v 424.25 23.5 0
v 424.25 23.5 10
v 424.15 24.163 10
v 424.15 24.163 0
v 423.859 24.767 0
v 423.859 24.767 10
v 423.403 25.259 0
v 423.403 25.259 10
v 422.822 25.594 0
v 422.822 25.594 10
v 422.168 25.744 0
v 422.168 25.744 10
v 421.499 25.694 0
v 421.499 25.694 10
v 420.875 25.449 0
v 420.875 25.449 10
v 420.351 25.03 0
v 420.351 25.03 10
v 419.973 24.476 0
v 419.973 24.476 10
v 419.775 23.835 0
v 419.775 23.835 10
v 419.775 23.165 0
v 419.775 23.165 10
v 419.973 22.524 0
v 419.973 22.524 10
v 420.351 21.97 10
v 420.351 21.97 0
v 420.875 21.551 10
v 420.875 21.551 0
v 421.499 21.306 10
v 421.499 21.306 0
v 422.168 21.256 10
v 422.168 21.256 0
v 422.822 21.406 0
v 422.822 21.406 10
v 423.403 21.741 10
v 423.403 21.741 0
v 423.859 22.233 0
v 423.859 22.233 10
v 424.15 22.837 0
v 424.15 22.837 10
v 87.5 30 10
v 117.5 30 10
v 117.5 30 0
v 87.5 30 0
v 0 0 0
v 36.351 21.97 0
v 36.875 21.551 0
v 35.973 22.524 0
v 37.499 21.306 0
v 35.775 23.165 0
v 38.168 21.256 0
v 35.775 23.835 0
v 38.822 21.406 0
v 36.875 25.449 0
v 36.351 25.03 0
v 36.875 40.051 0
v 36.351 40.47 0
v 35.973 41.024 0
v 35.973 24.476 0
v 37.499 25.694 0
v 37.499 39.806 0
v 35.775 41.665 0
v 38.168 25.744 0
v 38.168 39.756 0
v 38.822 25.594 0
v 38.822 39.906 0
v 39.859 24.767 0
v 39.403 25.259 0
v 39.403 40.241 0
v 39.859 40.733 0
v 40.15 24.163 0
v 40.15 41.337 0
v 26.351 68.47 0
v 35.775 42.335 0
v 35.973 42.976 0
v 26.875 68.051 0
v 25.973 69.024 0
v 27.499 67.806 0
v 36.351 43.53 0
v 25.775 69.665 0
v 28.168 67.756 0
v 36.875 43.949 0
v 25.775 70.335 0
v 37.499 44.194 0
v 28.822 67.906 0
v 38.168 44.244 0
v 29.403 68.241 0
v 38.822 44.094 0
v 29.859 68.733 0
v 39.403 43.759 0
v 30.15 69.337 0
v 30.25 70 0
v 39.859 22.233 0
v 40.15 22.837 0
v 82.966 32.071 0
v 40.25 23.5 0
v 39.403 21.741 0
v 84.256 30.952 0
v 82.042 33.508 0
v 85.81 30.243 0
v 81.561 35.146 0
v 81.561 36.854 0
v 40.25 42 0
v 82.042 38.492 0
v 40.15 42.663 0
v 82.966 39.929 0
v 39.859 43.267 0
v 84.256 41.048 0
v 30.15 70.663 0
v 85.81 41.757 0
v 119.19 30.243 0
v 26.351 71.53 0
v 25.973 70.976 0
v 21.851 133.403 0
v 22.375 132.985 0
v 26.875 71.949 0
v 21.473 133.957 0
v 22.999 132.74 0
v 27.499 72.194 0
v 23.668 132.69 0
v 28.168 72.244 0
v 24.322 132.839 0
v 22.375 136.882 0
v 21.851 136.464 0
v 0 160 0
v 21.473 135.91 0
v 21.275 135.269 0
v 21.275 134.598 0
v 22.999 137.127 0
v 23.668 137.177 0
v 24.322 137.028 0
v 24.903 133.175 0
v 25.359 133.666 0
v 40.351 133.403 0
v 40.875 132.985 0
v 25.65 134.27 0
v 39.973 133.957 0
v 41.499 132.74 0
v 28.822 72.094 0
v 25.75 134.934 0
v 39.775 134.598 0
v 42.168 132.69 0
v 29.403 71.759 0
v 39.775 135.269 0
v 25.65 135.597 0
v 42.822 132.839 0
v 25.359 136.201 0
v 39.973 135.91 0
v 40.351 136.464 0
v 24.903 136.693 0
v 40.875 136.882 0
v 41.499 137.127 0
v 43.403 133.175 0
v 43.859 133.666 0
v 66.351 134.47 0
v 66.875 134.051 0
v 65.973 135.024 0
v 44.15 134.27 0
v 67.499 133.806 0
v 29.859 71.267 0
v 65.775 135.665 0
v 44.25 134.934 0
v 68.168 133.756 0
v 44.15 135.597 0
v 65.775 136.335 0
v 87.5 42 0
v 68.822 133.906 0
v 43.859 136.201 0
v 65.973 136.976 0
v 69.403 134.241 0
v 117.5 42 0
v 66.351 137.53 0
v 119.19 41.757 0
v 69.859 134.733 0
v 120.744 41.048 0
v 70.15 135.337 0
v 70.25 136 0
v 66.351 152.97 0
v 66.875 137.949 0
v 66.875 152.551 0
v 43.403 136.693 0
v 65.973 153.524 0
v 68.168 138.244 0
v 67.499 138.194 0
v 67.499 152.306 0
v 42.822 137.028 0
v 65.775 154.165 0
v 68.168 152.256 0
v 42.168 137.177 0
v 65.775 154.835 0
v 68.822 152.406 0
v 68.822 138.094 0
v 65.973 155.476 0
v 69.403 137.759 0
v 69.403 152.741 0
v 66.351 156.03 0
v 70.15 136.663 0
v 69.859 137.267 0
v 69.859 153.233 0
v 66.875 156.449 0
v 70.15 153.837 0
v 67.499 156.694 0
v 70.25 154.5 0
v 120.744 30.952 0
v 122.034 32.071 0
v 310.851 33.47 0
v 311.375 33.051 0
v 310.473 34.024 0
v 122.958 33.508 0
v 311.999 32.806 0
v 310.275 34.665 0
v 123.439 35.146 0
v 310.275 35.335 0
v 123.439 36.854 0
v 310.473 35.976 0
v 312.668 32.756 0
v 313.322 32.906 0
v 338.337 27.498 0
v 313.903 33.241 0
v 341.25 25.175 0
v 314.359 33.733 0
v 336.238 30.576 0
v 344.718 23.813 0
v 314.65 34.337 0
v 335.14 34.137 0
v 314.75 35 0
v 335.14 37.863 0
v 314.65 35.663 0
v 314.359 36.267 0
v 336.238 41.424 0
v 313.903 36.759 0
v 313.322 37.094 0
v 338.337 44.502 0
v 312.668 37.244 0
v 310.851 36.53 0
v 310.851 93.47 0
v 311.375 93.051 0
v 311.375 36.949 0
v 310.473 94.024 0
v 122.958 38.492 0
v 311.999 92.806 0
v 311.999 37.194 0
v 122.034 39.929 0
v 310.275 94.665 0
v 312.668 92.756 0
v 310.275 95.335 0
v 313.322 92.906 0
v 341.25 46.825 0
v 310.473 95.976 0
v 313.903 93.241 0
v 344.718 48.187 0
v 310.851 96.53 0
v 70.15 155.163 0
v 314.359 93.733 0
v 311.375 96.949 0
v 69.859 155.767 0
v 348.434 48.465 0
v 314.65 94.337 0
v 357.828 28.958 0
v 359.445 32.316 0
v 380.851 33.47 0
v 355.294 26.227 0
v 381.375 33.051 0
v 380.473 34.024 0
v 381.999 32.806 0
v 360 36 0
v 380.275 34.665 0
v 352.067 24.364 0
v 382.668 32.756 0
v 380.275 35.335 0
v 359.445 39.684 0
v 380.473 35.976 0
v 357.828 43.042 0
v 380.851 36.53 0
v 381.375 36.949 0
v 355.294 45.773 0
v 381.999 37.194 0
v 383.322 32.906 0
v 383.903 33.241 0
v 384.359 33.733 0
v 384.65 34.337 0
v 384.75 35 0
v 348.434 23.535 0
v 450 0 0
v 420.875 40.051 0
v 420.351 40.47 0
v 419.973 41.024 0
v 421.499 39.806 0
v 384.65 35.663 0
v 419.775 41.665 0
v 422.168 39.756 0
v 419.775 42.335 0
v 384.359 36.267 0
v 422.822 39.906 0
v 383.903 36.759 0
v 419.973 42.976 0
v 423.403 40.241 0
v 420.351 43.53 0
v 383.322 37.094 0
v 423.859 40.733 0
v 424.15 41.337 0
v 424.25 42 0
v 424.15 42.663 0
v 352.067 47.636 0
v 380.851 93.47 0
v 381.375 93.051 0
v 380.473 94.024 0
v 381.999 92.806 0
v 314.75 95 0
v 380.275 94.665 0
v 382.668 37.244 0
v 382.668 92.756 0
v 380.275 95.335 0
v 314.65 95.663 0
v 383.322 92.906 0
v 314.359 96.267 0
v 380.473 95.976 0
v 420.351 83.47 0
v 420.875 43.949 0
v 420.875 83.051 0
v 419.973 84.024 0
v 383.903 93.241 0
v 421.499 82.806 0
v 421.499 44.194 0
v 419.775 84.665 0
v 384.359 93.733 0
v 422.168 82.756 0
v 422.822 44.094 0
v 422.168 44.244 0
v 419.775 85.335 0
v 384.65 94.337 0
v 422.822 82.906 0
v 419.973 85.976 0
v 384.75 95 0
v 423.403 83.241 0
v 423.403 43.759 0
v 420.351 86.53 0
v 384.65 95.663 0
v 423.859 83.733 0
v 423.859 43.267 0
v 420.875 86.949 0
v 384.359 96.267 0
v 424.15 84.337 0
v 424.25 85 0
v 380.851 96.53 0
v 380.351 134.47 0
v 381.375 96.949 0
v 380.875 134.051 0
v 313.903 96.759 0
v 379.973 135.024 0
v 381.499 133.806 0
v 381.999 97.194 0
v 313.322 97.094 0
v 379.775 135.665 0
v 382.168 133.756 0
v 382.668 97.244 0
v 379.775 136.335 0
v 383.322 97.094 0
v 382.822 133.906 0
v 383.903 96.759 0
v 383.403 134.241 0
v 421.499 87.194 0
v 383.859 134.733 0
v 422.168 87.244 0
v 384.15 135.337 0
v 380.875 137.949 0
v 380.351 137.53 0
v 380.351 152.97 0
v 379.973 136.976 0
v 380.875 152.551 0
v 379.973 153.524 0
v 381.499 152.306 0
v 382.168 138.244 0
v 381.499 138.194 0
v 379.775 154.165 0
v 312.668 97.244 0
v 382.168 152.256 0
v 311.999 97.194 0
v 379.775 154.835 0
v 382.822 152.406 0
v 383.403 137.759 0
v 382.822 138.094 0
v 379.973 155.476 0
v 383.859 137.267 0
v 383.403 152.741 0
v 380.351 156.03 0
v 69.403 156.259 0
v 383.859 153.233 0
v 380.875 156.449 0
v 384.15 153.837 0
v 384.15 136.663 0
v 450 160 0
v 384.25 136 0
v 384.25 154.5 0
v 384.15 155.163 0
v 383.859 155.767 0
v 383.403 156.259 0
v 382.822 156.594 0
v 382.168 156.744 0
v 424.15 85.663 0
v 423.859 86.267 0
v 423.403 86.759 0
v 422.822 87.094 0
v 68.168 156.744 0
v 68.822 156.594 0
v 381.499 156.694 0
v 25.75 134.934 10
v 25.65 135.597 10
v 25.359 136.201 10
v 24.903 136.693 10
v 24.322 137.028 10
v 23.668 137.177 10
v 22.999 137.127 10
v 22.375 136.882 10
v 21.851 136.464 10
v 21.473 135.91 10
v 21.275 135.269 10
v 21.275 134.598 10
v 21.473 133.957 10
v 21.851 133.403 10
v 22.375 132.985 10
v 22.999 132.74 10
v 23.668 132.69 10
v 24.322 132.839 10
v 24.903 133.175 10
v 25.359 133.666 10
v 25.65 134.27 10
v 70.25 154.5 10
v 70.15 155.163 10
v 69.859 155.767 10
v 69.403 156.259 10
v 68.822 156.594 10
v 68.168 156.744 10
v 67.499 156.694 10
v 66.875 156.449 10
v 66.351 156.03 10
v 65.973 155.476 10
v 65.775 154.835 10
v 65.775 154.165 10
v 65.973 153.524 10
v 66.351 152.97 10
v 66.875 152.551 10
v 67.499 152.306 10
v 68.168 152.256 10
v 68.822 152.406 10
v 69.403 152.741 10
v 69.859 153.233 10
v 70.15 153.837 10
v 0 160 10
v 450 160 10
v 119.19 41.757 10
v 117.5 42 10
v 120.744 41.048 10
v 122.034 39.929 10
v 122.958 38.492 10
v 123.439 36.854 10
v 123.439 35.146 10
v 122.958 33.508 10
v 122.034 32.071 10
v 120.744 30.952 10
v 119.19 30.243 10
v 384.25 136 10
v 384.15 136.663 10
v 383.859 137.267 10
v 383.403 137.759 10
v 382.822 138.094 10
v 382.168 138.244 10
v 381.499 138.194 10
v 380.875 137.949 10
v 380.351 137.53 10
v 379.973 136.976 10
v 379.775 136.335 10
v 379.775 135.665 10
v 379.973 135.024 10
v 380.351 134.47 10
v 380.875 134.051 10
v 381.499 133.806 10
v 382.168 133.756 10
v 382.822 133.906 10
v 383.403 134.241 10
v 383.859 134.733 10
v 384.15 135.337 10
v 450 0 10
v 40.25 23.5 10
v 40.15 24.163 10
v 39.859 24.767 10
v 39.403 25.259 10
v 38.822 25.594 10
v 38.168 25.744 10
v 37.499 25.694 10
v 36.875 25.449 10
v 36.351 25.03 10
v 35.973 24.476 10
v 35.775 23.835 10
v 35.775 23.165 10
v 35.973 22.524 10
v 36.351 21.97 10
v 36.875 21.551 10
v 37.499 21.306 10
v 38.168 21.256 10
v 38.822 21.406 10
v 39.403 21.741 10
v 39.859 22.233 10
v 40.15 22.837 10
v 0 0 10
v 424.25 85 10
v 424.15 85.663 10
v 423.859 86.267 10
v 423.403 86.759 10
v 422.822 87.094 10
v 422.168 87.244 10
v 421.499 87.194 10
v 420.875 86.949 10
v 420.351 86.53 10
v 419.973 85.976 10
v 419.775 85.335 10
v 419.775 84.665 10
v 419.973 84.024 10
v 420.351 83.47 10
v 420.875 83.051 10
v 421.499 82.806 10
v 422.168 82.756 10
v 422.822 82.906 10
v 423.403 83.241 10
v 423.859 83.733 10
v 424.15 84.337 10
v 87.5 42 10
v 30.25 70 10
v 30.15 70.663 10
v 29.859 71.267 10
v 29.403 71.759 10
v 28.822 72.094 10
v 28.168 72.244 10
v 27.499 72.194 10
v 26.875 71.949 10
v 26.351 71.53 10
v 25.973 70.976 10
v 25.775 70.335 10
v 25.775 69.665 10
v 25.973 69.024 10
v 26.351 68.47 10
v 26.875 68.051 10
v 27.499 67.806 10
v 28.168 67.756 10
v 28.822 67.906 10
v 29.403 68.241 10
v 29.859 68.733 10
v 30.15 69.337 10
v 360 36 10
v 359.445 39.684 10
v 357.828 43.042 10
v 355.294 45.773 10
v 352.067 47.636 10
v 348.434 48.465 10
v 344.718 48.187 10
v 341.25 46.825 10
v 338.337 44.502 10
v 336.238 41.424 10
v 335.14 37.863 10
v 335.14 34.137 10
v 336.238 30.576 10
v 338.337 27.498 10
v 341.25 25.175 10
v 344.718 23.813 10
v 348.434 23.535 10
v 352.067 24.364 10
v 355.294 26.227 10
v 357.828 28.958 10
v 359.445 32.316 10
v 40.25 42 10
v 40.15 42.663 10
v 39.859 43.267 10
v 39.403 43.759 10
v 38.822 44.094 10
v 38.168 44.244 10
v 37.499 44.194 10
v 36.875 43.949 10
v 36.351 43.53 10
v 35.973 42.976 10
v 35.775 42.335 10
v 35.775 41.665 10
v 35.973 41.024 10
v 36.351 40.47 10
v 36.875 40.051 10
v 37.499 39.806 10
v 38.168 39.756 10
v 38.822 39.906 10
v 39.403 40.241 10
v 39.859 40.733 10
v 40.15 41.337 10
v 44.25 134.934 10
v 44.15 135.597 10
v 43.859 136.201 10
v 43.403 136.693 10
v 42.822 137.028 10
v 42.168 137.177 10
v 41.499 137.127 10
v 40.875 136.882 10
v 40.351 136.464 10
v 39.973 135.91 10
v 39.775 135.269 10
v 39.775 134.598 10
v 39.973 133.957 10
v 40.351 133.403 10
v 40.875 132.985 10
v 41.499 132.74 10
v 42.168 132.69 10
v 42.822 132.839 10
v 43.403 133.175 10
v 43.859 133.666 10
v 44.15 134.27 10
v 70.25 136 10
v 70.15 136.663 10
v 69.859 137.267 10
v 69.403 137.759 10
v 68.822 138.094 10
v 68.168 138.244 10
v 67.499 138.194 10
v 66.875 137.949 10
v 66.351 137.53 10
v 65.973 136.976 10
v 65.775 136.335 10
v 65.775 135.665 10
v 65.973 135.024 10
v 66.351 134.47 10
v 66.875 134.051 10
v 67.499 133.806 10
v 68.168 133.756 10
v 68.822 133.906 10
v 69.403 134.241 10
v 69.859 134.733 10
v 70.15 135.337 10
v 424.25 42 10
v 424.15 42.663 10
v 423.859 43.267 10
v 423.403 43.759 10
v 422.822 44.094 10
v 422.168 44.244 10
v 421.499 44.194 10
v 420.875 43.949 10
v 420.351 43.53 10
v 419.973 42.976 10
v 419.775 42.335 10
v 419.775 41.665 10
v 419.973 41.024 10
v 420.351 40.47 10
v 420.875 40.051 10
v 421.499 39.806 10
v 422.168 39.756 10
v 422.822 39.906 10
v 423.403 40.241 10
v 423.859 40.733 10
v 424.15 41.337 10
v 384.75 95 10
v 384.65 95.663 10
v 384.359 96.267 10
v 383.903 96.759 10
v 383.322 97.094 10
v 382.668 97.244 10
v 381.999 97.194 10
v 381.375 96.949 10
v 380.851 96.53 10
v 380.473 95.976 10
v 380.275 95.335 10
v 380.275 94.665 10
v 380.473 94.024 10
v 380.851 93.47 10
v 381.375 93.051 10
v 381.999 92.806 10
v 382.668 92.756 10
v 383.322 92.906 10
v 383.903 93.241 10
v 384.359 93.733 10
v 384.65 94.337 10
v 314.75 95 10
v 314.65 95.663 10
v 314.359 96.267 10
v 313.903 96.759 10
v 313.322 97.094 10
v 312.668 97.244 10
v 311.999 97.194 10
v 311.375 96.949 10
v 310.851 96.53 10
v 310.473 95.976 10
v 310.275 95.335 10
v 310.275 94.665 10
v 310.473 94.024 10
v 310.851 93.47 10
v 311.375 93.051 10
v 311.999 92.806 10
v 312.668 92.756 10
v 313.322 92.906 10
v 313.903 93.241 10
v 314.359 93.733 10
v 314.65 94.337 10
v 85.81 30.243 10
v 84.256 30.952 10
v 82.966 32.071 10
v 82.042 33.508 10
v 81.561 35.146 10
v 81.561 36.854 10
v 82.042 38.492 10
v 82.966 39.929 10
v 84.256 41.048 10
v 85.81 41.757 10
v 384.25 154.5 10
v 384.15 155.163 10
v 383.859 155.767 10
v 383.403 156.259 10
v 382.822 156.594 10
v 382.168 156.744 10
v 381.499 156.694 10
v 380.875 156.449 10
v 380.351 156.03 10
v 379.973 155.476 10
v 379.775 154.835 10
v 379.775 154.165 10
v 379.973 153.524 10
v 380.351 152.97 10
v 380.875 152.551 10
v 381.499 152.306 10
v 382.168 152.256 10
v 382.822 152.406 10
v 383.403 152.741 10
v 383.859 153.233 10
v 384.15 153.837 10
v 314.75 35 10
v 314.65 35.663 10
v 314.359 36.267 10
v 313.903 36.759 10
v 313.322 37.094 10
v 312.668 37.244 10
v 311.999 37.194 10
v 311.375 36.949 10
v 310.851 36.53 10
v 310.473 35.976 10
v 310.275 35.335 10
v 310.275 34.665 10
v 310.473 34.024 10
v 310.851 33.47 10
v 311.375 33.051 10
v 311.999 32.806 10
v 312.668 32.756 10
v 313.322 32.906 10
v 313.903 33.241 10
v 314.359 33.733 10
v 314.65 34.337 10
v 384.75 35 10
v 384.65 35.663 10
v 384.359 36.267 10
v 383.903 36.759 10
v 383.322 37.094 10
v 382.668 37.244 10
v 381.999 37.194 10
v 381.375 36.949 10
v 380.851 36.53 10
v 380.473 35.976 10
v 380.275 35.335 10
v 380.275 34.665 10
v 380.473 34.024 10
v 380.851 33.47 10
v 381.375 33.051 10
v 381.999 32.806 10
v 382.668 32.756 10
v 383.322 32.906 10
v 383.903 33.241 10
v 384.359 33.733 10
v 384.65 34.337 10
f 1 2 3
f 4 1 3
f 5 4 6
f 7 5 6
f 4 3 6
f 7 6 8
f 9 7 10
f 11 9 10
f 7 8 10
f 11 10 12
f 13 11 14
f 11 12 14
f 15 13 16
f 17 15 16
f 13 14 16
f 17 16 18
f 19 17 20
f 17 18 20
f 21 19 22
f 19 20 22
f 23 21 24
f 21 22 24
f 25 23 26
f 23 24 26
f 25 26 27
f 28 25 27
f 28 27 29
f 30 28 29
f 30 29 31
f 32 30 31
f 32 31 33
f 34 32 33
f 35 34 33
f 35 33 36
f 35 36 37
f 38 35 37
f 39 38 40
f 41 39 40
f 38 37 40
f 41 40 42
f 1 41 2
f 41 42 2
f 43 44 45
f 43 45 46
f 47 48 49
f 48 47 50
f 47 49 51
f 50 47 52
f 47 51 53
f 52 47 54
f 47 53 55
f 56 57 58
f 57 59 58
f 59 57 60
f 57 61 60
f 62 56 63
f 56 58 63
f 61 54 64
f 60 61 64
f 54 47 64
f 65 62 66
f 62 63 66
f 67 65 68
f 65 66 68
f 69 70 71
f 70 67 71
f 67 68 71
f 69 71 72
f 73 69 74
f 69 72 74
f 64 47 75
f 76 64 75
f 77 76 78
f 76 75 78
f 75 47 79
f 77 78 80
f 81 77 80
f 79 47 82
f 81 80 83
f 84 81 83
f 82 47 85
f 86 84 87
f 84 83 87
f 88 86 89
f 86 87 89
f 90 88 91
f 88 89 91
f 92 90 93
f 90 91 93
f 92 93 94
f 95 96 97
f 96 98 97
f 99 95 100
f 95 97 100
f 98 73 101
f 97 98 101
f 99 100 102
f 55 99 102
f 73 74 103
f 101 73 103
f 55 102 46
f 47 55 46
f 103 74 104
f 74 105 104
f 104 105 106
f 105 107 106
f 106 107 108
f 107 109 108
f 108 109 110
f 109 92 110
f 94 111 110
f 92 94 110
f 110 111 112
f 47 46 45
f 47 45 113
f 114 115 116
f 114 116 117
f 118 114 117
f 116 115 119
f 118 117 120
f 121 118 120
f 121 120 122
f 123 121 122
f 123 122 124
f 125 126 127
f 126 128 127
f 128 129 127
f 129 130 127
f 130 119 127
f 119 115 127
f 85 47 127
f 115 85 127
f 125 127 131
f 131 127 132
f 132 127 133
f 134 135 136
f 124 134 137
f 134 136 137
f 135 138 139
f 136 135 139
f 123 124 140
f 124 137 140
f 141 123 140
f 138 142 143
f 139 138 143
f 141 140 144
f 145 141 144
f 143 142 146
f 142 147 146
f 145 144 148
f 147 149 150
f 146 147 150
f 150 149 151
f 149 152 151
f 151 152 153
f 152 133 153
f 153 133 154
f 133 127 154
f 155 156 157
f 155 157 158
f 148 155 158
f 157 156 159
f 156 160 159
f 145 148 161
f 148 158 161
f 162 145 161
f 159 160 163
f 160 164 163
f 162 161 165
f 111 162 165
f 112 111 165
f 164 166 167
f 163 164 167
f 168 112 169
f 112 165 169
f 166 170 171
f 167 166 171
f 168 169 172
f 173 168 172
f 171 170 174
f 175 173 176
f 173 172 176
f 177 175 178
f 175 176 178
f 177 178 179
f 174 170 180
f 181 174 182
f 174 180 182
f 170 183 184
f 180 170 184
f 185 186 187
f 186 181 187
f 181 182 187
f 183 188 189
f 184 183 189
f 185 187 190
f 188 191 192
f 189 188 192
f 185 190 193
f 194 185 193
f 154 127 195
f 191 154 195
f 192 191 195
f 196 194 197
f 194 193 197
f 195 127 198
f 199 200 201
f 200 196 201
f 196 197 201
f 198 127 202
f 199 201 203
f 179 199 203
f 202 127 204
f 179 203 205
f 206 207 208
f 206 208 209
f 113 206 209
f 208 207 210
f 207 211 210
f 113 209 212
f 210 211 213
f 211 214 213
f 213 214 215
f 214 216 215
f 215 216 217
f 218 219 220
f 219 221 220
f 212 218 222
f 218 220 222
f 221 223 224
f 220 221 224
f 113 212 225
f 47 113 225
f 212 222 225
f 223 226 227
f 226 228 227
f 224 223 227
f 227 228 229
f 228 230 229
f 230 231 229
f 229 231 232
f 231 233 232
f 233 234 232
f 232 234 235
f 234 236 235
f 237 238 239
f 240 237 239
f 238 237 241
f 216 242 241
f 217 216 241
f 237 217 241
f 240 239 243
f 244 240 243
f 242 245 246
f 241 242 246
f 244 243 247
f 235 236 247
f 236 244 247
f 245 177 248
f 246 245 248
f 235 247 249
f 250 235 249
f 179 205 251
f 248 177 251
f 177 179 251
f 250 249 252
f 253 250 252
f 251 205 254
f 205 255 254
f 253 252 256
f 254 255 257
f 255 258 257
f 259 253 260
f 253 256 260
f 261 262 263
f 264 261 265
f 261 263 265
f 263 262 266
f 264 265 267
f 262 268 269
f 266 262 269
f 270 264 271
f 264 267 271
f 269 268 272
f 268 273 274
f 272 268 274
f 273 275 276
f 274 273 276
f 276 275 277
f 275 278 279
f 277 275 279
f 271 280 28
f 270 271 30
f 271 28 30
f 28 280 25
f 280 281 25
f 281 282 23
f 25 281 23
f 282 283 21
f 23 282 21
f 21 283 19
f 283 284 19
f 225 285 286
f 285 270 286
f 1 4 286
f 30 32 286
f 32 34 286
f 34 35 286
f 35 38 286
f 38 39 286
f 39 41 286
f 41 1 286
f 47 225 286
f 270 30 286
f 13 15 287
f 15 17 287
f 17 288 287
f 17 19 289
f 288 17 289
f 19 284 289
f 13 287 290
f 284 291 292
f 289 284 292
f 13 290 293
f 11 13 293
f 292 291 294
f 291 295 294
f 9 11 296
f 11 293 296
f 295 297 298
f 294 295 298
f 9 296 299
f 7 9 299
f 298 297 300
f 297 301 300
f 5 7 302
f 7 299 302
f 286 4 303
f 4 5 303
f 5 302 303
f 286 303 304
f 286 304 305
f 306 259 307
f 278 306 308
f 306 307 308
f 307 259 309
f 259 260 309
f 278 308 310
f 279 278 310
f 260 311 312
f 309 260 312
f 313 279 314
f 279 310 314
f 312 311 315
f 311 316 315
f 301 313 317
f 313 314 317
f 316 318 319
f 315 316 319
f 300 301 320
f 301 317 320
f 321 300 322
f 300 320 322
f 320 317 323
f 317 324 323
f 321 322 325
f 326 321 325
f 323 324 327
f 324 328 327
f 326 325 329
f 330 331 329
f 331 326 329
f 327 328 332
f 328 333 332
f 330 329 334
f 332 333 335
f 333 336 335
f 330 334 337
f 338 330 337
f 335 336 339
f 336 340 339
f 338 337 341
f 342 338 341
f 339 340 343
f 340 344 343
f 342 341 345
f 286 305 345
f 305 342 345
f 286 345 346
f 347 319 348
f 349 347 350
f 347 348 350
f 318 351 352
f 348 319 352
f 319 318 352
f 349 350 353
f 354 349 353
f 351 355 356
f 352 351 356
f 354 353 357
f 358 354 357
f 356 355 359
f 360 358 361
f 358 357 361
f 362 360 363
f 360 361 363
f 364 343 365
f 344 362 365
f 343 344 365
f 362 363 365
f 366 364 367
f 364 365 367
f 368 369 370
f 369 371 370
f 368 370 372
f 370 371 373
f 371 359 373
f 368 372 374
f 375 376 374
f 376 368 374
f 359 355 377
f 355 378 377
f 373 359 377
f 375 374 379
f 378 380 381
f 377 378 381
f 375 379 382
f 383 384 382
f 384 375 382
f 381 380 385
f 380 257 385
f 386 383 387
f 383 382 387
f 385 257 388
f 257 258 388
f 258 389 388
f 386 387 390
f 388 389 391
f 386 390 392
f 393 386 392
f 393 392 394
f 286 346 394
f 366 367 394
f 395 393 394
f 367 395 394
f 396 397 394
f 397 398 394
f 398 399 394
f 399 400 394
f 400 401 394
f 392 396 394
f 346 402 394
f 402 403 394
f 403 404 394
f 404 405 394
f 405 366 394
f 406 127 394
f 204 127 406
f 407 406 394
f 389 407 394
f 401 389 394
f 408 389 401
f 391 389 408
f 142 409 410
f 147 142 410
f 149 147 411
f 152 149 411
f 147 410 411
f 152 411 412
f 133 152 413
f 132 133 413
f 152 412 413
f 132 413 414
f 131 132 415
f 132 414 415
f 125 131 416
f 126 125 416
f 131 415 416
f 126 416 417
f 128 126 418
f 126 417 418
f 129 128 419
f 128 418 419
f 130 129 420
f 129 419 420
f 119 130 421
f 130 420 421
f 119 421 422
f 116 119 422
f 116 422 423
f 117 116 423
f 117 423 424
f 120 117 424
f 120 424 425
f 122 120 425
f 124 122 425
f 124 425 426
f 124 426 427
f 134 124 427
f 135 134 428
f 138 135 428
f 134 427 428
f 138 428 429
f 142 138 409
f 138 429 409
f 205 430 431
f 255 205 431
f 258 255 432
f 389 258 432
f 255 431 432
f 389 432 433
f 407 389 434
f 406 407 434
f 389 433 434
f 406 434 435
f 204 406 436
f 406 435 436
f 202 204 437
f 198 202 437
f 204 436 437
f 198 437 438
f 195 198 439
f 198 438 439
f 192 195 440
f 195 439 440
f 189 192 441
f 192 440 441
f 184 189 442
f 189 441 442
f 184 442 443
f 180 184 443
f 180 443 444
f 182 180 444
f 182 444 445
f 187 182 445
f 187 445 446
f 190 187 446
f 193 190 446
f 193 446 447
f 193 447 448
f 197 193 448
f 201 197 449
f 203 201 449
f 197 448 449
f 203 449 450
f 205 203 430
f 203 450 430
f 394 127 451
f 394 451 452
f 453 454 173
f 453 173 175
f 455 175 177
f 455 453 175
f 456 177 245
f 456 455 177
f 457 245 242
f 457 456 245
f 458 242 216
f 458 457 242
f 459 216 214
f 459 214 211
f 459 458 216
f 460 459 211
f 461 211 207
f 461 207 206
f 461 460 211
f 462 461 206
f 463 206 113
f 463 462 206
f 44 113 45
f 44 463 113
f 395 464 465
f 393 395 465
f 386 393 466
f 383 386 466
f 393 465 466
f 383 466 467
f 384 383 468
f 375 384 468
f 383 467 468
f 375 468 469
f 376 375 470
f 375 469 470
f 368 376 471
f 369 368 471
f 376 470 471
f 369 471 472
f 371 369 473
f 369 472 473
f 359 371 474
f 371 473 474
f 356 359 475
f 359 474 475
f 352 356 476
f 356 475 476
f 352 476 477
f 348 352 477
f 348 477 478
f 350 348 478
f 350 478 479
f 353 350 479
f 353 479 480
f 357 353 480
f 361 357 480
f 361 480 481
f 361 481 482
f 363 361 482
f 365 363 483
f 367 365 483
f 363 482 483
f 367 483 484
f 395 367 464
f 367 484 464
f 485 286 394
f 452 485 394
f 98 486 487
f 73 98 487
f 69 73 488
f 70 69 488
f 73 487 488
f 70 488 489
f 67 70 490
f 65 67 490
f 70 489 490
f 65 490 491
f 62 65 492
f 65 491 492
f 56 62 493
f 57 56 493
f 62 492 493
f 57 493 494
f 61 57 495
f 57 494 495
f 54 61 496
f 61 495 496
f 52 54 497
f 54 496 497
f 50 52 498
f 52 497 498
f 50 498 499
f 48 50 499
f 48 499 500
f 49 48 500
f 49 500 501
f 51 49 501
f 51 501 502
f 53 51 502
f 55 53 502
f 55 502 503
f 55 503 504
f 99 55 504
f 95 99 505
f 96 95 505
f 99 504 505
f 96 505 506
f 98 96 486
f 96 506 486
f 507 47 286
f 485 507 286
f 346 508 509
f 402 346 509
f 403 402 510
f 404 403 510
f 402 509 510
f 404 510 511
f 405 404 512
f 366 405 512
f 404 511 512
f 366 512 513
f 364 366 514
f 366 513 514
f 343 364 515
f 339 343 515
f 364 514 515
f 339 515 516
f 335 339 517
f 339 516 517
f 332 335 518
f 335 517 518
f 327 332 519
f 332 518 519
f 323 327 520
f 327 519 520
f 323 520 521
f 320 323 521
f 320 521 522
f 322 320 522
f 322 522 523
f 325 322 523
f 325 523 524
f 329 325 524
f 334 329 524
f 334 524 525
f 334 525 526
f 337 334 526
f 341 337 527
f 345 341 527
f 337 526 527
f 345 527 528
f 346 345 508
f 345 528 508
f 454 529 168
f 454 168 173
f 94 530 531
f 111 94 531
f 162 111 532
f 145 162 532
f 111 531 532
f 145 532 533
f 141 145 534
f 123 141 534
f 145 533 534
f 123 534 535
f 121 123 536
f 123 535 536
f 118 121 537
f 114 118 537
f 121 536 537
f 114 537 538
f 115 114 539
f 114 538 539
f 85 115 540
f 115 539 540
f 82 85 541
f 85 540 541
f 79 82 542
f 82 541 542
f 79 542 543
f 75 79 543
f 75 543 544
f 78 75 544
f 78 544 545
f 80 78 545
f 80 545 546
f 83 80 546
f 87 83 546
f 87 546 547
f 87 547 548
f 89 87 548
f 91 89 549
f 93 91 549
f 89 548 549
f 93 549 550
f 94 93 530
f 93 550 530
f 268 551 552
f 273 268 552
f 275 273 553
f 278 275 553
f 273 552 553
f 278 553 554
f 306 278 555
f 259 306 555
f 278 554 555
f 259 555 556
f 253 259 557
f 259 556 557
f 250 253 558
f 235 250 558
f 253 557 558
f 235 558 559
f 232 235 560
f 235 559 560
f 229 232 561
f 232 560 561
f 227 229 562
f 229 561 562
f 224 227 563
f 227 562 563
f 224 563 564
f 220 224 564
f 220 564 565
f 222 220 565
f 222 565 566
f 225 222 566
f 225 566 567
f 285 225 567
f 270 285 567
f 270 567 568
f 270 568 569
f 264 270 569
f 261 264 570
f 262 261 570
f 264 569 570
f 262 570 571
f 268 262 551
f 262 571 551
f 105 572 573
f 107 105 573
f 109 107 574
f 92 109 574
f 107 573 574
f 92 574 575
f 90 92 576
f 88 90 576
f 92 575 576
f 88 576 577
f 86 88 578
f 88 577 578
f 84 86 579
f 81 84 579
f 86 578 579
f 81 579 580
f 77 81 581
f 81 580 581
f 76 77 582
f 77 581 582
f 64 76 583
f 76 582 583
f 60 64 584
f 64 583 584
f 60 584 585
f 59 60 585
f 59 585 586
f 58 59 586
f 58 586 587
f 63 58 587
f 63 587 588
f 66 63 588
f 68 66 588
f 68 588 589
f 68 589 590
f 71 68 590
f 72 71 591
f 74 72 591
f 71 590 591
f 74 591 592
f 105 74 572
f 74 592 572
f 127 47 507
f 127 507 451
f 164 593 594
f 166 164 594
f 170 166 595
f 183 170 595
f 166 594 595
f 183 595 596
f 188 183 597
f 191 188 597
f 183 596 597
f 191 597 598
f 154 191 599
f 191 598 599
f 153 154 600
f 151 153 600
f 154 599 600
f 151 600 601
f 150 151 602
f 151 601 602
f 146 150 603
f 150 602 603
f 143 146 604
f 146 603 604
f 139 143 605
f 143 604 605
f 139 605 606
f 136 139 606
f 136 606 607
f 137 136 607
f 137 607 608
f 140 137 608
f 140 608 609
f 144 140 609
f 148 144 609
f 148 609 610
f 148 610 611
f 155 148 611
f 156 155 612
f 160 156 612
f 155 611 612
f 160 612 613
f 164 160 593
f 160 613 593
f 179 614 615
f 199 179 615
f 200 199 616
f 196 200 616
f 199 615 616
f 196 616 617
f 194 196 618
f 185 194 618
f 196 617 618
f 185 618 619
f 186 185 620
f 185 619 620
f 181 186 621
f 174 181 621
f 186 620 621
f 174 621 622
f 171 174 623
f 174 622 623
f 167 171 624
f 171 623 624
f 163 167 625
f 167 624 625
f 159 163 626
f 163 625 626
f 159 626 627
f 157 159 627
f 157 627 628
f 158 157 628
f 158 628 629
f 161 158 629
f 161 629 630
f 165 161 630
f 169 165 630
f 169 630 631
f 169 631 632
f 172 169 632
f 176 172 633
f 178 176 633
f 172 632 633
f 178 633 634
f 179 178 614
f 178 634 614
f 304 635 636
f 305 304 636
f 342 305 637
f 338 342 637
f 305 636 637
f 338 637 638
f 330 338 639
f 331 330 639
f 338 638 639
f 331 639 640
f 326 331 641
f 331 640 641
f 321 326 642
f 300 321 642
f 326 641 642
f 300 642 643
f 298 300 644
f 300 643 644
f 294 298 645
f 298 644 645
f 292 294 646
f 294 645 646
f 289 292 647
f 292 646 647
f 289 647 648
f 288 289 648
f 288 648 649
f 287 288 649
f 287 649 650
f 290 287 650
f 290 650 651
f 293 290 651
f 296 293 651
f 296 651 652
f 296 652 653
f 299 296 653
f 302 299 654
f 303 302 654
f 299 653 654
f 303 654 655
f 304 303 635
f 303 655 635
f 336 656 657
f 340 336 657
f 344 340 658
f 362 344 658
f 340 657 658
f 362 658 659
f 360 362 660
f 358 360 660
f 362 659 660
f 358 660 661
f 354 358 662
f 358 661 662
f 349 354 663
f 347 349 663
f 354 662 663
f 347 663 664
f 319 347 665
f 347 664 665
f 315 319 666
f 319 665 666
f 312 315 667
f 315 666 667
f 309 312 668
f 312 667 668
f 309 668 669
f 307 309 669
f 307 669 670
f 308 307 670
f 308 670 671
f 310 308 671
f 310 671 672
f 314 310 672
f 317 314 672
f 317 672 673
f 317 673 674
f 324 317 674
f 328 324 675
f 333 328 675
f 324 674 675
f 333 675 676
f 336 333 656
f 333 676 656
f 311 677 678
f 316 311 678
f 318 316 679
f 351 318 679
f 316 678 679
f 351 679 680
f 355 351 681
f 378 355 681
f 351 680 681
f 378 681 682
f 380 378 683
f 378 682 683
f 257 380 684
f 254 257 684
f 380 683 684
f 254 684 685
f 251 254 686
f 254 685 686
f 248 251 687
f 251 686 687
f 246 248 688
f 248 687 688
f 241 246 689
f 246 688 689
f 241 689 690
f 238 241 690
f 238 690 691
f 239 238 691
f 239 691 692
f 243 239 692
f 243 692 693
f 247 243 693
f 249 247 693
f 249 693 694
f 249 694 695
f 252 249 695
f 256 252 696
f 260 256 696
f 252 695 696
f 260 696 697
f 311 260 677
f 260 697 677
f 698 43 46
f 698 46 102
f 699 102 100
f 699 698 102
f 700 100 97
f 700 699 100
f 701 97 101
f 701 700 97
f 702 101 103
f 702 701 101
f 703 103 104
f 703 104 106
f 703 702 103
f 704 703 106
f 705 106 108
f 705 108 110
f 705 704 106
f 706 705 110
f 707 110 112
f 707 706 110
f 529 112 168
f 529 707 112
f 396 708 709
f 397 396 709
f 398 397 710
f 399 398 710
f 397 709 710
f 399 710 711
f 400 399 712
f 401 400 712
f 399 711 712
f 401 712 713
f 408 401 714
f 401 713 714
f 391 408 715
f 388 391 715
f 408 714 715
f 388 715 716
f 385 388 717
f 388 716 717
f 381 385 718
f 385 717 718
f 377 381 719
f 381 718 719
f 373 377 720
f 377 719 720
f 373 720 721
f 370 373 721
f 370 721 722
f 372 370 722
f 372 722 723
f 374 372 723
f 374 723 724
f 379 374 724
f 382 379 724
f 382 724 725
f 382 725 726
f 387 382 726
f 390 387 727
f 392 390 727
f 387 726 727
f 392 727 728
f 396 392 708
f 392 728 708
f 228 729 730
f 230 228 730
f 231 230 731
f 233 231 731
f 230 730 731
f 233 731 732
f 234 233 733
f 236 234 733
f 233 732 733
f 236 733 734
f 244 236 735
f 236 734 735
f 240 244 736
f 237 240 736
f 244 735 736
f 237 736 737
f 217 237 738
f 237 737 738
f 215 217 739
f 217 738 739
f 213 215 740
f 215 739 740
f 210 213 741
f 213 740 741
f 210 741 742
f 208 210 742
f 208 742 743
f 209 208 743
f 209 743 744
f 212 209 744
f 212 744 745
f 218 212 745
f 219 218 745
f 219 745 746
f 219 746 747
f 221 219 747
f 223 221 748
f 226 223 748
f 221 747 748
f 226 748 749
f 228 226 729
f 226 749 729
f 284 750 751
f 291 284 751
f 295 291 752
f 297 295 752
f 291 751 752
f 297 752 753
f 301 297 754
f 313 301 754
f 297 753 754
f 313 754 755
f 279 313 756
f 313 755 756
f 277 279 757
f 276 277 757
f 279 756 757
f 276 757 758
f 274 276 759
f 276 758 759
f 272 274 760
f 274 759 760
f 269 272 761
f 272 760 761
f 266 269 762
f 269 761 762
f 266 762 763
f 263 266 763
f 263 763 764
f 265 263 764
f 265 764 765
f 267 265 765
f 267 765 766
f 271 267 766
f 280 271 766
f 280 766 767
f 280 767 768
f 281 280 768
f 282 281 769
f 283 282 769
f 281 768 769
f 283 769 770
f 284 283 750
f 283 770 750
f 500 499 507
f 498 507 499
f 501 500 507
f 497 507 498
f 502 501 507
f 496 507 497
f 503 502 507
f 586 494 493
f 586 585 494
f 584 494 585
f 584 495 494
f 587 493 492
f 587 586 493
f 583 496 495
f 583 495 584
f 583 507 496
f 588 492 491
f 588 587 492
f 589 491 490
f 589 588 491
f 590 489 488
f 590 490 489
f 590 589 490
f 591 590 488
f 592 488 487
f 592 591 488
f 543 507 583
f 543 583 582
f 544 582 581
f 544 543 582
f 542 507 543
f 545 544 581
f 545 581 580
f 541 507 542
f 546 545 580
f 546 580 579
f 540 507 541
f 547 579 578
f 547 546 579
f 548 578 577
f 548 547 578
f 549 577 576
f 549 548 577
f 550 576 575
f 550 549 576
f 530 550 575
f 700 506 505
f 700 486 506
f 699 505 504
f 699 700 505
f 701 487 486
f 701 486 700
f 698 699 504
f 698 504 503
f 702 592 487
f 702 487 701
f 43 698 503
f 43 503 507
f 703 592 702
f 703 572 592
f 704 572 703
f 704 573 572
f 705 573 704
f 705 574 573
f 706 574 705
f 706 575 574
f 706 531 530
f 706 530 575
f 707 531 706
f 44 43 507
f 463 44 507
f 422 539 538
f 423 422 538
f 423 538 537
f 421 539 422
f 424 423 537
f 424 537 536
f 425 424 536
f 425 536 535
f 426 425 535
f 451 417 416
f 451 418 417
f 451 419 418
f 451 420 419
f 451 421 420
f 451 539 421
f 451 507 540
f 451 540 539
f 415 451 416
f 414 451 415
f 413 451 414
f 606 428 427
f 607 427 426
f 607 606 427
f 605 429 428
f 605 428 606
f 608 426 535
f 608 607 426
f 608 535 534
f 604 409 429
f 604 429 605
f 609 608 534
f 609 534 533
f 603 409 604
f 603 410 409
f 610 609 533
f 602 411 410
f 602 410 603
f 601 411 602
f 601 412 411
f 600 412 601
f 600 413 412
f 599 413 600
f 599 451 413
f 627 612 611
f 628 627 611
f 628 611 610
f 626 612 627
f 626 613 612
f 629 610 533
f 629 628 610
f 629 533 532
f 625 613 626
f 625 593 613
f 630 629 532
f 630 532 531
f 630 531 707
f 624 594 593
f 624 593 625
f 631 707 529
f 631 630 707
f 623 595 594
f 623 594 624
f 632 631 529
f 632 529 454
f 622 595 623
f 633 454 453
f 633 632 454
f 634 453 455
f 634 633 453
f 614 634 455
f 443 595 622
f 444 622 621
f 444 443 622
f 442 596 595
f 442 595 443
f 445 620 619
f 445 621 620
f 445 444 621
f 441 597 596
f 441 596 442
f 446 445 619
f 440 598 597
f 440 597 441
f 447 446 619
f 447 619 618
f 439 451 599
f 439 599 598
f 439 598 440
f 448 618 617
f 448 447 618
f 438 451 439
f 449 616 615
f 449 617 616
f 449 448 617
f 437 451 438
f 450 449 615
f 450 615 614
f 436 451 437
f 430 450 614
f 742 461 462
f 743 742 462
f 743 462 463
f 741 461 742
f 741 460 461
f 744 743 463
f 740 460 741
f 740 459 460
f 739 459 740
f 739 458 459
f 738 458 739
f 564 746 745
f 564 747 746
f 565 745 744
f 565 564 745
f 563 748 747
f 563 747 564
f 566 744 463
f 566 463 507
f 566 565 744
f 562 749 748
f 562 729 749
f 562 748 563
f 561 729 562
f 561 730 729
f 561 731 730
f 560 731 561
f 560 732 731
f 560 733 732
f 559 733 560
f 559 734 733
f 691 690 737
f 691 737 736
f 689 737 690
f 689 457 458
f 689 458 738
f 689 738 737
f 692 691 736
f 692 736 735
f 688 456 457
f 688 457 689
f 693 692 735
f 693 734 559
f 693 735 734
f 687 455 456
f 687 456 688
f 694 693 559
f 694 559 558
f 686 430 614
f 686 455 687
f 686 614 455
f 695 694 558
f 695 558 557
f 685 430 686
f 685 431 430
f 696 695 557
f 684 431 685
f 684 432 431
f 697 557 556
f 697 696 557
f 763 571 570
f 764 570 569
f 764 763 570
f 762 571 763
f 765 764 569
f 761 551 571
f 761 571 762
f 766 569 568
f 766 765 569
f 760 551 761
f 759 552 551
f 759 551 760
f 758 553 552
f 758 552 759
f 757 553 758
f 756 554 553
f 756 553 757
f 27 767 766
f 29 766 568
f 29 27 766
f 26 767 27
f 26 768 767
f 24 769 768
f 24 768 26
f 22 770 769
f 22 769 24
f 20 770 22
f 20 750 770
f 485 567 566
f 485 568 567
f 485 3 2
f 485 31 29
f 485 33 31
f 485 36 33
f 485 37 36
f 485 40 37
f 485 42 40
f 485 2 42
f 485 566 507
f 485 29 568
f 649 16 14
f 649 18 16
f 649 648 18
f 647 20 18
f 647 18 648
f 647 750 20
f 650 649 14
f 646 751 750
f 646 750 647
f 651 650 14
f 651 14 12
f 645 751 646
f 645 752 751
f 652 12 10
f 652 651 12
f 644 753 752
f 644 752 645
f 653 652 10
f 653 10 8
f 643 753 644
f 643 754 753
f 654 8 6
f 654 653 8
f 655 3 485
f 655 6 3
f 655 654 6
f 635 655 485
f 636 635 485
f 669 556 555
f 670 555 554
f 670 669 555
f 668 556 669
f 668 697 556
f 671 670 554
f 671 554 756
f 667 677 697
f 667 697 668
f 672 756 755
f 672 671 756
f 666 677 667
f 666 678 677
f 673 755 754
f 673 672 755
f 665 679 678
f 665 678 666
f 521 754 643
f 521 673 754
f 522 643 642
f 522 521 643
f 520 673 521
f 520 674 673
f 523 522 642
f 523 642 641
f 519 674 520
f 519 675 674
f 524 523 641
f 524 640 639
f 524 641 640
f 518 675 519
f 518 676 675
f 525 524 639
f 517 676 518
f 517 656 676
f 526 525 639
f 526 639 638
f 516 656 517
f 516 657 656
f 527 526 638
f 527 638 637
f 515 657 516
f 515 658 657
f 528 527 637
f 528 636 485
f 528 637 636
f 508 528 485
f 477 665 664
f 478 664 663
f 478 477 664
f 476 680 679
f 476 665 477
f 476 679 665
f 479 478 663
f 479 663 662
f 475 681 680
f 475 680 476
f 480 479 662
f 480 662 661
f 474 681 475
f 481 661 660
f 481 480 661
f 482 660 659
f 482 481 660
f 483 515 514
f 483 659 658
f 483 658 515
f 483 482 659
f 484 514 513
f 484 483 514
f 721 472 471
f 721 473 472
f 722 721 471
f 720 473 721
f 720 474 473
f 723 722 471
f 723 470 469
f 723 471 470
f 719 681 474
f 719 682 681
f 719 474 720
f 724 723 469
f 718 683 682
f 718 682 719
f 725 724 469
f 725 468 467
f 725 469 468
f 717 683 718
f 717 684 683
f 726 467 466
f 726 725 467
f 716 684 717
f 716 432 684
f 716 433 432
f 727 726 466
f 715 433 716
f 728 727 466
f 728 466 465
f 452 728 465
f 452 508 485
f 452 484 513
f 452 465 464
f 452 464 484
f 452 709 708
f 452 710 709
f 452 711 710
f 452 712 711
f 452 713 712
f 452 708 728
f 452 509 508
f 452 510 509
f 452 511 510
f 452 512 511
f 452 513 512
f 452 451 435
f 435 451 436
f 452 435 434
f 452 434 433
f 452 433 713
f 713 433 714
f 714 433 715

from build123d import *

# Parameters (mm, degrees)
SCHIZZO1_W                   = 450
SCHIZZO1_H                   = 160
ESTRUSIONE_ESTRUSIONE1_DEPTH = 10
SCHIZZO2_R                   = 12.5
SCHIZZO2_R_2                 = 2.25
TAGLIO_ESTRUSIONE1_DEPTH     = 10


with BuildPart() as part:
    # Schizzo1 → Estrusione-Estrusione1 (new body)
    with BuildSketch(Plane.XY):
        with Locations((225, 80)):
            Rectangle(SCHIZZO1_W, SCHIZZO1_H)
    extrude(amount=ESTRUSIONE_ESTRUSIONE1_DEPTH)

    # Schizzo2 → Taglio-Estrusione1 (cut)
    with BuildSketch(Plane.XY.offset(10)):
        with Locations((347.5, 36)):
            Circle(SCHIZZO2_R)
        with Locations((382, 154.5)):
            Circle(SCHIZZO2_R_2)
        with Locations((382, 136)):
            Circle(SCHIZZO2_R_2)
        with Locations((68, 154.5)):
            Circle(SCHIZZO2_R_2)
        with Locations((68, 136)):
            Circle(SCHIZZO2_R_2)
        with Locations((38, 42)):
            Circle(SCHIZZO2_R_2)
        with Locations((38, 23.5)):
            Circle(SCHIZZO2_R_2)
        with Locations((422, 23.5)):
            Circle(SCHIZZO2_R_2)
        with Locations((422, 42)):
            Circle(SCHIZZO2_R_2)
        with Locations((23.5, 134.933694222)):
            Circle(SCHIZZO2_R_2)
        with Locations((42, 134.933694222)):
            Circle(SCHIZZO2_R_2)
        with Locations((28, 70)):
            Circle(SCHIZZO2_R_2)
        with Locations((422, 85)):
            Circle(SCHIZZO2_R_2)
        with Locations((312.5, 95)):
            Circle(SCHIZZO2_R_2)
        with Locations((382.5, 95)):
            Circle(SCHIZZO2_R_2)
        with Locations((382.5, 35)):
            Circle(SCHIZZO2_R_2)
        with Locations((312.5, 35)):
            Circle(SCHIZZO2_R_2)
        with BuildLine():
            Line((87.5, 42), (117.5, 42))
            ThreePointArc((117.5, 42), (123.5, 36), (117.5, 30))
            Line((117.5, 30), (87.5, 30))
            ThreePointArc((87.5, 30), (81.5, 36), (87.5, 42))
        make_face()
    extrude(amount=-TAGLIO_ESTRUSIONE1_DEPTH, mode=Mode.SUBTRACT)


solid = part.part
